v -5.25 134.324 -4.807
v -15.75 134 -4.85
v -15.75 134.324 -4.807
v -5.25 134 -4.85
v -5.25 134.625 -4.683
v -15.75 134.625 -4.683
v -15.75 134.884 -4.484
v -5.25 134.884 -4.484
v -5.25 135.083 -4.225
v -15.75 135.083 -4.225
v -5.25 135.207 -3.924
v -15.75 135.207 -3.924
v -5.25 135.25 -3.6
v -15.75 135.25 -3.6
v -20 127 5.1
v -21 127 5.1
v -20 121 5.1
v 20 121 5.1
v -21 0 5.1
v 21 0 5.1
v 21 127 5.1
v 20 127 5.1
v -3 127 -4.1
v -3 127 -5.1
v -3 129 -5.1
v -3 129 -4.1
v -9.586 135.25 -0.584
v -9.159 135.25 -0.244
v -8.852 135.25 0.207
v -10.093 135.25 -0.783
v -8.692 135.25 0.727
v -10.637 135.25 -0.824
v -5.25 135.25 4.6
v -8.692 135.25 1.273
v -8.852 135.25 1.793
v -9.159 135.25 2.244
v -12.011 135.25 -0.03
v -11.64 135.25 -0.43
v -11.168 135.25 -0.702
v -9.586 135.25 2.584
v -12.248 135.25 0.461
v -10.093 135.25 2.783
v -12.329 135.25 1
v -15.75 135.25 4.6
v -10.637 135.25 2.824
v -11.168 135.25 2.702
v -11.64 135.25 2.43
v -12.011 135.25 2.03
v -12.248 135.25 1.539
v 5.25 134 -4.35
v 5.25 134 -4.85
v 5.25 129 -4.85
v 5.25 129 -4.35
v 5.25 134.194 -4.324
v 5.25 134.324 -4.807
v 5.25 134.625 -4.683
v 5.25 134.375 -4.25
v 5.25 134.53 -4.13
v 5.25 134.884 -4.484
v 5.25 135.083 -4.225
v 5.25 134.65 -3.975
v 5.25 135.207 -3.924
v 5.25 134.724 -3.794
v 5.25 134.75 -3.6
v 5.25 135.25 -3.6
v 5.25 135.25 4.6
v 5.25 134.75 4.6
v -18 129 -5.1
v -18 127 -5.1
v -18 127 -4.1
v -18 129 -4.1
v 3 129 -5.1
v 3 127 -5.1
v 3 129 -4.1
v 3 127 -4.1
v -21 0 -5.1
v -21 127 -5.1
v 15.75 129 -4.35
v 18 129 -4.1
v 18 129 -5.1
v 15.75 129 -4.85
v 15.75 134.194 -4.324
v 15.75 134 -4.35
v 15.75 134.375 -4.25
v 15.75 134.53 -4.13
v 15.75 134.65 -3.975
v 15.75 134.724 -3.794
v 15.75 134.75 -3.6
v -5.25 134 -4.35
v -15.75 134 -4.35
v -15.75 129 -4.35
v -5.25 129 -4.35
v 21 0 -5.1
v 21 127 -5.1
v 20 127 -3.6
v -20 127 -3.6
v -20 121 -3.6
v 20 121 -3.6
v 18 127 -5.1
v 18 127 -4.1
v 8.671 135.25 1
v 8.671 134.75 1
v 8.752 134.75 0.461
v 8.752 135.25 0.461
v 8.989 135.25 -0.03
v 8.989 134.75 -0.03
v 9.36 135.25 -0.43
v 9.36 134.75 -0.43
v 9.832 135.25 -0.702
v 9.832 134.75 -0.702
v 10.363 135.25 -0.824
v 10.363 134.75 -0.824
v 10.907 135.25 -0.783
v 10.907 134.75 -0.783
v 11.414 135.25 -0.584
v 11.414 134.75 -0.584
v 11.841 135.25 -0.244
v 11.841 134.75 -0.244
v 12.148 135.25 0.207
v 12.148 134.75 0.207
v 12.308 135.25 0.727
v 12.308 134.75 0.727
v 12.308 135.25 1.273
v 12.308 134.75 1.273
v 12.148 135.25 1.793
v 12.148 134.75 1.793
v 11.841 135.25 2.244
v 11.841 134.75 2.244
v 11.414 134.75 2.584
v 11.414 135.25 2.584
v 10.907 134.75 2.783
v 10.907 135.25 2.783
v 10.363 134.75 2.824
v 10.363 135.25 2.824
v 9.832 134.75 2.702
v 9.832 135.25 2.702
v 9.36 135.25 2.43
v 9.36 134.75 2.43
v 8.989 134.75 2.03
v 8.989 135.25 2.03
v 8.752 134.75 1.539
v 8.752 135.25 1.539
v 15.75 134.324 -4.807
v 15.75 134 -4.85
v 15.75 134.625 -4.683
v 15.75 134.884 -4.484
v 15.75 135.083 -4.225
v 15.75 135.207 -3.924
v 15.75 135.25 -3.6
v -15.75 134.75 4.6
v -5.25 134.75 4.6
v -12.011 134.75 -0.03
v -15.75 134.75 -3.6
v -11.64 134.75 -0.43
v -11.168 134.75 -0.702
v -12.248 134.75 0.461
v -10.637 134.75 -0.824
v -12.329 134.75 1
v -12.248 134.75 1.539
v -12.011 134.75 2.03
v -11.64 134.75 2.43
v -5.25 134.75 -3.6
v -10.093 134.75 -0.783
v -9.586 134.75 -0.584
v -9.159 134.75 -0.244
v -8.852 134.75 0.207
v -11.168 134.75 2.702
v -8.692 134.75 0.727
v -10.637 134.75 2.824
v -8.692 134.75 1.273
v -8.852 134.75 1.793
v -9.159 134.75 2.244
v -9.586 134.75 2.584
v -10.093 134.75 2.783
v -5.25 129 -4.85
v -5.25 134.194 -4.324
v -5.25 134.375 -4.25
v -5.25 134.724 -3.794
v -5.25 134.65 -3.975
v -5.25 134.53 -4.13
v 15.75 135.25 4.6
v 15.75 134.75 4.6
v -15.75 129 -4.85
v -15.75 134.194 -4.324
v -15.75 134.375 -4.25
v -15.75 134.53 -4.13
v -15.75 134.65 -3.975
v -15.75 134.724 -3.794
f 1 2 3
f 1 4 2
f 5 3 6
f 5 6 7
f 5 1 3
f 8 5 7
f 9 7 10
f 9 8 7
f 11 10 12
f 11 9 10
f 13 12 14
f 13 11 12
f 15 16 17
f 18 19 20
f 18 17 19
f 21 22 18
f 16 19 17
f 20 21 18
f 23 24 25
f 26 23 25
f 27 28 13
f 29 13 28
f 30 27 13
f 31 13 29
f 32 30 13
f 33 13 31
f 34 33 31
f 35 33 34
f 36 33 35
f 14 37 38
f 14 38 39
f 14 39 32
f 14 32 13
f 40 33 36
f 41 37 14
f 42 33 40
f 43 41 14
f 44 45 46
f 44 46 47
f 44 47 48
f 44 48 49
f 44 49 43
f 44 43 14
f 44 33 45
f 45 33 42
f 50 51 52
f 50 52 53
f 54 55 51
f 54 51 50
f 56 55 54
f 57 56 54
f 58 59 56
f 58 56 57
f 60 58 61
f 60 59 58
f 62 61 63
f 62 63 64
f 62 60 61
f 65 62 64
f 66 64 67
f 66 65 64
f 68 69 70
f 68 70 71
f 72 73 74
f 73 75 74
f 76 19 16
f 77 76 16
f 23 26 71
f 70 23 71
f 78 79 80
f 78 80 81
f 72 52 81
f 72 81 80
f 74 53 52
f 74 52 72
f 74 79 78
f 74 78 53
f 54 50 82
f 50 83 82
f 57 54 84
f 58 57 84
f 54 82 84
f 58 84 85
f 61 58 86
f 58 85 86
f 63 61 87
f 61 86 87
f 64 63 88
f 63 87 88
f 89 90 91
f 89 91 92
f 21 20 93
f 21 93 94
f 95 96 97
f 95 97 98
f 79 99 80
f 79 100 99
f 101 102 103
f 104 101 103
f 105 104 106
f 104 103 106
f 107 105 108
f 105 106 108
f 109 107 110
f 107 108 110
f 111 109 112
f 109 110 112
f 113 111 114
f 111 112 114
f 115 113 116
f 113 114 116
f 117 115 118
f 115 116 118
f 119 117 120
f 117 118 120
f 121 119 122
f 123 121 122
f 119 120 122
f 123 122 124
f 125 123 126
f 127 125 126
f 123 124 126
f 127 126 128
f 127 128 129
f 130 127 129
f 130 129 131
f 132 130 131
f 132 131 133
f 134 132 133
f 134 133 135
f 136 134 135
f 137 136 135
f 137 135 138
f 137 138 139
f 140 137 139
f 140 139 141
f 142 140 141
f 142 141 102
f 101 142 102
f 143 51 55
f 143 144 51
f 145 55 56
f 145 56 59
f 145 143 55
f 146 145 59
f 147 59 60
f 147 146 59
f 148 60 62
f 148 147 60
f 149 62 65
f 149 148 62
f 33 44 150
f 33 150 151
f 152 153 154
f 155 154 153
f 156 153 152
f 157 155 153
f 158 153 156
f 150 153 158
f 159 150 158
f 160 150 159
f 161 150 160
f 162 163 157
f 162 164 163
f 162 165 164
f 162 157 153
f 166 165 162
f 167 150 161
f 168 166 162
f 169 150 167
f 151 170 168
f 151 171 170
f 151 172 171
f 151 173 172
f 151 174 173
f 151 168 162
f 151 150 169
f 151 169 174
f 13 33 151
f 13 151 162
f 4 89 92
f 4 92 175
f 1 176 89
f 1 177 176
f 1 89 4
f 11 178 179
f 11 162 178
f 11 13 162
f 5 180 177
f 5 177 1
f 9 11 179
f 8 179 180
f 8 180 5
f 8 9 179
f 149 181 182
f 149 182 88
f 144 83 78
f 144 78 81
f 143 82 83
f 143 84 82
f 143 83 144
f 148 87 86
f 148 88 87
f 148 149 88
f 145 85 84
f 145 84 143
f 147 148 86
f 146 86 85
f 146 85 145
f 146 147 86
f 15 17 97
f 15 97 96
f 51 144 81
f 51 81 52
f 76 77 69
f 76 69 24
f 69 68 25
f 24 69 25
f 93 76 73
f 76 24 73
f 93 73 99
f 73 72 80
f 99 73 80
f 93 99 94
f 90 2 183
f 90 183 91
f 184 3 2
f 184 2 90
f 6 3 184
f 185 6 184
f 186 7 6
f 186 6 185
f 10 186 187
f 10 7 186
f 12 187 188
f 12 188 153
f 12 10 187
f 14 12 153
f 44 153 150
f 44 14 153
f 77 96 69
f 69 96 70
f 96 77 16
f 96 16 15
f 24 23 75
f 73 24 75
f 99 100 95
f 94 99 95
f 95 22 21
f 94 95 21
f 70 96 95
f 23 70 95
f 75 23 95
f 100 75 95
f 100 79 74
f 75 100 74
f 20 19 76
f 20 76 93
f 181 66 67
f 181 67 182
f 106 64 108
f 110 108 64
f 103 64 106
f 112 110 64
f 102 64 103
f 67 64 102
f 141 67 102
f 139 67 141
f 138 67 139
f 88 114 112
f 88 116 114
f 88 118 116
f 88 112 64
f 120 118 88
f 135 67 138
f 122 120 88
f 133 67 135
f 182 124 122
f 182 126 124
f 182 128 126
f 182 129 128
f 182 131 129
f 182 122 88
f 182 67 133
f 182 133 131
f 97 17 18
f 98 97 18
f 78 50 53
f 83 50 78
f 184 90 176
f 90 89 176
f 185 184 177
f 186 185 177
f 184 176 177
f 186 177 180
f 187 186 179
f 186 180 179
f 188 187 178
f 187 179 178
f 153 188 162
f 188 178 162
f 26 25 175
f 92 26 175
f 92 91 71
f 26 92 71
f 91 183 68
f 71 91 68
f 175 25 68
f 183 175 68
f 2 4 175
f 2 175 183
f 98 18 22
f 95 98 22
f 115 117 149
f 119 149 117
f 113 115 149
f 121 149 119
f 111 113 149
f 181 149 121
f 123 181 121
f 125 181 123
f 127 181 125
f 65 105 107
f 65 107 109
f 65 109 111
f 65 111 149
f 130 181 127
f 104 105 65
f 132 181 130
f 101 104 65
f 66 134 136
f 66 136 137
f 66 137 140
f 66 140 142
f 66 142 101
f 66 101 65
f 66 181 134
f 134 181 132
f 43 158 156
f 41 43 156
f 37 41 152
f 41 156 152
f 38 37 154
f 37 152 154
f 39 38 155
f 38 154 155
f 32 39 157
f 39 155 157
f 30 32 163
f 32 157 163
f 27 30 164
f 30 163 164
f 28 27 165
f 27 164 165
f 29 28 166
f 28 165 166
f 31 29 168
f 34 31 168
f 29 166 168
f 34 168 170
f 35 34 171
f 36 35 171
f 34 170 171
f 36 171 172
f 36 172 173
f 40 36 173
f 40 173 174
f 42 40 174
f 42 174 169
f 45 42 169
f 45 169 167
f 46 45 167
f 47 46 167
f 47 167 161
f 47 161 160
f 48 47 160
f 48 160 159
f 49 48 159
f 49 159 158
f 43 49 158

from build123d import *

# Parameters (mm, degrees)
SKETCH1_W                 = 42
SKETCH1_H                 = 127
BOSS_EXTRUDE1_DEPTH       = 5.1
SKETCH2_W                 = 40
SKETCH2_H                 = 6
CUT_EXTRUDE1_DEPTH        = 8.7
SKETCH3_W                 = 15
SKETCH3_H                 = 2
BOSS_EXTRUDE2_DEPTH       = 0.5
TAB_PROFILE_W             = 10.5
TAB_PROFILE_H             = 0.5
FILLET2_R                 = 0.75
FILLET1_R                 = 1.25
FILLET4_R                 = 0.75
FILLET3_R                 = 1.25
F_6_CLEARANCE_HOLE1_D     = 3.6576
F_6_CLEARANCE_HOLE1_DEPTH = 0.5
F_6_CLEARANCE_HOLE2_D     = 3.6576
F_6_CLEARANCE_HOLE2_DEPTH = 0.5


with BuildPart() as part:
    # Sketch1 → Boss-Extrude1 (new, symmetric)
    with BuildSketch(Plane.XY):
        with Locations((0, 63.5)):
            Rectangle(SKETCH1_W, SKETCH1_H)
    extrude(amount=BOSS_EXTRUDE1_DEPTH, both=True)

    # Sketch2 → Cut-Extrude1 (cut)
    with BuildSketch(Plane.XY.offset(5.1)):
        with Locations((0, 124)):
            Rectangle(SKETCH2_W, SKETCH2_H)
    extrude(amount=-CUT_EXTRUDE1_DEPTH, mode=Mode.SUBTRACT)

    # Sketch3 → Boss-Extrude2 (add, symmetric)
    with BuildSketch(Plane(origin=(0, 0, -4.6), x_dir=(-1, 0, 0), z_dir=(0, 0, -1))):
        with Locations((-10.5, 128)):
            Rectangle(SKETCH3_W, SKETCH3_H)
        with Locations((10.5, 128)):
            Rectangle(SKETCH3_W, SKETCH3_H)
    extrude(amount=BOSS_EXTRUDE2_DEPTH, both=True)

    # Tabs: sweep along a path in Tab Bend
    with BuildLine(Plane(origin=(0, 0, 0), x_dir=(0, 0, -1), z_dir=(1, 0, 0))) as tabs_path:
        Line((4.6, 129), (4.6, 135))
        Line((4.6, 135), (-4.6, 135))
    # Tab Profile → Tabs (sweep)
    with BuildSketch(Plane(origin=(0, 129, 0), x_dir=(1, 0, 0), z_dir=(0, 1, 0))):
        with Locations((-10.5, 4.6)):
            Rectangle(TAB_PROFILE_W, TAB_PROFILE_H)
        with Locations((10.5, 4.6)):
            Rectangle(TAB_PROFILE_W, TAB_PROFILE_H)
    sweep(path=tabs_path.line, transition=Transition.RIGHT)

    # Fillet2
    fillet2_edges = [part.edges().sort_by_distance(p)[0] for p in [
        (10.5, 134.75, -4.35),
    ]]
    fillet(fillet2_edges, radius=FILLET2_R)

    # Fillet1
    fillet1_edges = [part.edges().sort_by_distance(p)[0] for p in [
        (10.5, 135.25, -4.85),
    ]]
    fillet(fillet1_edges, radius=FILLET1_R)

    # Fillet4
    fillet4_edges = [part.edges().sort_by_distance(p)[0] for p in [
        (-10.5, 134.75, -4.35),
    ]]
    fillet(fillet4_edges, radius=FILLET4_R)

    # Fillet3
    fillet3_edges = [part.edges().sort_by_distance(p)[0] for p in [
        (-10.5, 135.25, -4.85),
    ]]
    fillet(fillet3_edges, radius=FILLET3_R)

    # #6 Clearance Hole1
    with Locations(Plane(origin=(0, 135.25, 0), x_dir=(1, 0, 0), z_dir=(0, 1, 0))):
        with Locations((-10.5, -1)):
            Hole(F_6_CLEARANCE_HOLE1_D / 2, depth=F_6_CLEARANCE_HOLE1_DEPTH)

    # #6 Clearance Hole2
    with Locations(Plane(origin=(0, 135.25, 0), x_dir=(1, 0, 0), z_dir=(0, 1, 0))):
        with Locations((10.5, -1)):
            Hole(F_6_CLEARANCE_HOLE2_D / 2, depth=F_6_CLEARANCE_HOLE2_DEPTH)


solid = part.part
